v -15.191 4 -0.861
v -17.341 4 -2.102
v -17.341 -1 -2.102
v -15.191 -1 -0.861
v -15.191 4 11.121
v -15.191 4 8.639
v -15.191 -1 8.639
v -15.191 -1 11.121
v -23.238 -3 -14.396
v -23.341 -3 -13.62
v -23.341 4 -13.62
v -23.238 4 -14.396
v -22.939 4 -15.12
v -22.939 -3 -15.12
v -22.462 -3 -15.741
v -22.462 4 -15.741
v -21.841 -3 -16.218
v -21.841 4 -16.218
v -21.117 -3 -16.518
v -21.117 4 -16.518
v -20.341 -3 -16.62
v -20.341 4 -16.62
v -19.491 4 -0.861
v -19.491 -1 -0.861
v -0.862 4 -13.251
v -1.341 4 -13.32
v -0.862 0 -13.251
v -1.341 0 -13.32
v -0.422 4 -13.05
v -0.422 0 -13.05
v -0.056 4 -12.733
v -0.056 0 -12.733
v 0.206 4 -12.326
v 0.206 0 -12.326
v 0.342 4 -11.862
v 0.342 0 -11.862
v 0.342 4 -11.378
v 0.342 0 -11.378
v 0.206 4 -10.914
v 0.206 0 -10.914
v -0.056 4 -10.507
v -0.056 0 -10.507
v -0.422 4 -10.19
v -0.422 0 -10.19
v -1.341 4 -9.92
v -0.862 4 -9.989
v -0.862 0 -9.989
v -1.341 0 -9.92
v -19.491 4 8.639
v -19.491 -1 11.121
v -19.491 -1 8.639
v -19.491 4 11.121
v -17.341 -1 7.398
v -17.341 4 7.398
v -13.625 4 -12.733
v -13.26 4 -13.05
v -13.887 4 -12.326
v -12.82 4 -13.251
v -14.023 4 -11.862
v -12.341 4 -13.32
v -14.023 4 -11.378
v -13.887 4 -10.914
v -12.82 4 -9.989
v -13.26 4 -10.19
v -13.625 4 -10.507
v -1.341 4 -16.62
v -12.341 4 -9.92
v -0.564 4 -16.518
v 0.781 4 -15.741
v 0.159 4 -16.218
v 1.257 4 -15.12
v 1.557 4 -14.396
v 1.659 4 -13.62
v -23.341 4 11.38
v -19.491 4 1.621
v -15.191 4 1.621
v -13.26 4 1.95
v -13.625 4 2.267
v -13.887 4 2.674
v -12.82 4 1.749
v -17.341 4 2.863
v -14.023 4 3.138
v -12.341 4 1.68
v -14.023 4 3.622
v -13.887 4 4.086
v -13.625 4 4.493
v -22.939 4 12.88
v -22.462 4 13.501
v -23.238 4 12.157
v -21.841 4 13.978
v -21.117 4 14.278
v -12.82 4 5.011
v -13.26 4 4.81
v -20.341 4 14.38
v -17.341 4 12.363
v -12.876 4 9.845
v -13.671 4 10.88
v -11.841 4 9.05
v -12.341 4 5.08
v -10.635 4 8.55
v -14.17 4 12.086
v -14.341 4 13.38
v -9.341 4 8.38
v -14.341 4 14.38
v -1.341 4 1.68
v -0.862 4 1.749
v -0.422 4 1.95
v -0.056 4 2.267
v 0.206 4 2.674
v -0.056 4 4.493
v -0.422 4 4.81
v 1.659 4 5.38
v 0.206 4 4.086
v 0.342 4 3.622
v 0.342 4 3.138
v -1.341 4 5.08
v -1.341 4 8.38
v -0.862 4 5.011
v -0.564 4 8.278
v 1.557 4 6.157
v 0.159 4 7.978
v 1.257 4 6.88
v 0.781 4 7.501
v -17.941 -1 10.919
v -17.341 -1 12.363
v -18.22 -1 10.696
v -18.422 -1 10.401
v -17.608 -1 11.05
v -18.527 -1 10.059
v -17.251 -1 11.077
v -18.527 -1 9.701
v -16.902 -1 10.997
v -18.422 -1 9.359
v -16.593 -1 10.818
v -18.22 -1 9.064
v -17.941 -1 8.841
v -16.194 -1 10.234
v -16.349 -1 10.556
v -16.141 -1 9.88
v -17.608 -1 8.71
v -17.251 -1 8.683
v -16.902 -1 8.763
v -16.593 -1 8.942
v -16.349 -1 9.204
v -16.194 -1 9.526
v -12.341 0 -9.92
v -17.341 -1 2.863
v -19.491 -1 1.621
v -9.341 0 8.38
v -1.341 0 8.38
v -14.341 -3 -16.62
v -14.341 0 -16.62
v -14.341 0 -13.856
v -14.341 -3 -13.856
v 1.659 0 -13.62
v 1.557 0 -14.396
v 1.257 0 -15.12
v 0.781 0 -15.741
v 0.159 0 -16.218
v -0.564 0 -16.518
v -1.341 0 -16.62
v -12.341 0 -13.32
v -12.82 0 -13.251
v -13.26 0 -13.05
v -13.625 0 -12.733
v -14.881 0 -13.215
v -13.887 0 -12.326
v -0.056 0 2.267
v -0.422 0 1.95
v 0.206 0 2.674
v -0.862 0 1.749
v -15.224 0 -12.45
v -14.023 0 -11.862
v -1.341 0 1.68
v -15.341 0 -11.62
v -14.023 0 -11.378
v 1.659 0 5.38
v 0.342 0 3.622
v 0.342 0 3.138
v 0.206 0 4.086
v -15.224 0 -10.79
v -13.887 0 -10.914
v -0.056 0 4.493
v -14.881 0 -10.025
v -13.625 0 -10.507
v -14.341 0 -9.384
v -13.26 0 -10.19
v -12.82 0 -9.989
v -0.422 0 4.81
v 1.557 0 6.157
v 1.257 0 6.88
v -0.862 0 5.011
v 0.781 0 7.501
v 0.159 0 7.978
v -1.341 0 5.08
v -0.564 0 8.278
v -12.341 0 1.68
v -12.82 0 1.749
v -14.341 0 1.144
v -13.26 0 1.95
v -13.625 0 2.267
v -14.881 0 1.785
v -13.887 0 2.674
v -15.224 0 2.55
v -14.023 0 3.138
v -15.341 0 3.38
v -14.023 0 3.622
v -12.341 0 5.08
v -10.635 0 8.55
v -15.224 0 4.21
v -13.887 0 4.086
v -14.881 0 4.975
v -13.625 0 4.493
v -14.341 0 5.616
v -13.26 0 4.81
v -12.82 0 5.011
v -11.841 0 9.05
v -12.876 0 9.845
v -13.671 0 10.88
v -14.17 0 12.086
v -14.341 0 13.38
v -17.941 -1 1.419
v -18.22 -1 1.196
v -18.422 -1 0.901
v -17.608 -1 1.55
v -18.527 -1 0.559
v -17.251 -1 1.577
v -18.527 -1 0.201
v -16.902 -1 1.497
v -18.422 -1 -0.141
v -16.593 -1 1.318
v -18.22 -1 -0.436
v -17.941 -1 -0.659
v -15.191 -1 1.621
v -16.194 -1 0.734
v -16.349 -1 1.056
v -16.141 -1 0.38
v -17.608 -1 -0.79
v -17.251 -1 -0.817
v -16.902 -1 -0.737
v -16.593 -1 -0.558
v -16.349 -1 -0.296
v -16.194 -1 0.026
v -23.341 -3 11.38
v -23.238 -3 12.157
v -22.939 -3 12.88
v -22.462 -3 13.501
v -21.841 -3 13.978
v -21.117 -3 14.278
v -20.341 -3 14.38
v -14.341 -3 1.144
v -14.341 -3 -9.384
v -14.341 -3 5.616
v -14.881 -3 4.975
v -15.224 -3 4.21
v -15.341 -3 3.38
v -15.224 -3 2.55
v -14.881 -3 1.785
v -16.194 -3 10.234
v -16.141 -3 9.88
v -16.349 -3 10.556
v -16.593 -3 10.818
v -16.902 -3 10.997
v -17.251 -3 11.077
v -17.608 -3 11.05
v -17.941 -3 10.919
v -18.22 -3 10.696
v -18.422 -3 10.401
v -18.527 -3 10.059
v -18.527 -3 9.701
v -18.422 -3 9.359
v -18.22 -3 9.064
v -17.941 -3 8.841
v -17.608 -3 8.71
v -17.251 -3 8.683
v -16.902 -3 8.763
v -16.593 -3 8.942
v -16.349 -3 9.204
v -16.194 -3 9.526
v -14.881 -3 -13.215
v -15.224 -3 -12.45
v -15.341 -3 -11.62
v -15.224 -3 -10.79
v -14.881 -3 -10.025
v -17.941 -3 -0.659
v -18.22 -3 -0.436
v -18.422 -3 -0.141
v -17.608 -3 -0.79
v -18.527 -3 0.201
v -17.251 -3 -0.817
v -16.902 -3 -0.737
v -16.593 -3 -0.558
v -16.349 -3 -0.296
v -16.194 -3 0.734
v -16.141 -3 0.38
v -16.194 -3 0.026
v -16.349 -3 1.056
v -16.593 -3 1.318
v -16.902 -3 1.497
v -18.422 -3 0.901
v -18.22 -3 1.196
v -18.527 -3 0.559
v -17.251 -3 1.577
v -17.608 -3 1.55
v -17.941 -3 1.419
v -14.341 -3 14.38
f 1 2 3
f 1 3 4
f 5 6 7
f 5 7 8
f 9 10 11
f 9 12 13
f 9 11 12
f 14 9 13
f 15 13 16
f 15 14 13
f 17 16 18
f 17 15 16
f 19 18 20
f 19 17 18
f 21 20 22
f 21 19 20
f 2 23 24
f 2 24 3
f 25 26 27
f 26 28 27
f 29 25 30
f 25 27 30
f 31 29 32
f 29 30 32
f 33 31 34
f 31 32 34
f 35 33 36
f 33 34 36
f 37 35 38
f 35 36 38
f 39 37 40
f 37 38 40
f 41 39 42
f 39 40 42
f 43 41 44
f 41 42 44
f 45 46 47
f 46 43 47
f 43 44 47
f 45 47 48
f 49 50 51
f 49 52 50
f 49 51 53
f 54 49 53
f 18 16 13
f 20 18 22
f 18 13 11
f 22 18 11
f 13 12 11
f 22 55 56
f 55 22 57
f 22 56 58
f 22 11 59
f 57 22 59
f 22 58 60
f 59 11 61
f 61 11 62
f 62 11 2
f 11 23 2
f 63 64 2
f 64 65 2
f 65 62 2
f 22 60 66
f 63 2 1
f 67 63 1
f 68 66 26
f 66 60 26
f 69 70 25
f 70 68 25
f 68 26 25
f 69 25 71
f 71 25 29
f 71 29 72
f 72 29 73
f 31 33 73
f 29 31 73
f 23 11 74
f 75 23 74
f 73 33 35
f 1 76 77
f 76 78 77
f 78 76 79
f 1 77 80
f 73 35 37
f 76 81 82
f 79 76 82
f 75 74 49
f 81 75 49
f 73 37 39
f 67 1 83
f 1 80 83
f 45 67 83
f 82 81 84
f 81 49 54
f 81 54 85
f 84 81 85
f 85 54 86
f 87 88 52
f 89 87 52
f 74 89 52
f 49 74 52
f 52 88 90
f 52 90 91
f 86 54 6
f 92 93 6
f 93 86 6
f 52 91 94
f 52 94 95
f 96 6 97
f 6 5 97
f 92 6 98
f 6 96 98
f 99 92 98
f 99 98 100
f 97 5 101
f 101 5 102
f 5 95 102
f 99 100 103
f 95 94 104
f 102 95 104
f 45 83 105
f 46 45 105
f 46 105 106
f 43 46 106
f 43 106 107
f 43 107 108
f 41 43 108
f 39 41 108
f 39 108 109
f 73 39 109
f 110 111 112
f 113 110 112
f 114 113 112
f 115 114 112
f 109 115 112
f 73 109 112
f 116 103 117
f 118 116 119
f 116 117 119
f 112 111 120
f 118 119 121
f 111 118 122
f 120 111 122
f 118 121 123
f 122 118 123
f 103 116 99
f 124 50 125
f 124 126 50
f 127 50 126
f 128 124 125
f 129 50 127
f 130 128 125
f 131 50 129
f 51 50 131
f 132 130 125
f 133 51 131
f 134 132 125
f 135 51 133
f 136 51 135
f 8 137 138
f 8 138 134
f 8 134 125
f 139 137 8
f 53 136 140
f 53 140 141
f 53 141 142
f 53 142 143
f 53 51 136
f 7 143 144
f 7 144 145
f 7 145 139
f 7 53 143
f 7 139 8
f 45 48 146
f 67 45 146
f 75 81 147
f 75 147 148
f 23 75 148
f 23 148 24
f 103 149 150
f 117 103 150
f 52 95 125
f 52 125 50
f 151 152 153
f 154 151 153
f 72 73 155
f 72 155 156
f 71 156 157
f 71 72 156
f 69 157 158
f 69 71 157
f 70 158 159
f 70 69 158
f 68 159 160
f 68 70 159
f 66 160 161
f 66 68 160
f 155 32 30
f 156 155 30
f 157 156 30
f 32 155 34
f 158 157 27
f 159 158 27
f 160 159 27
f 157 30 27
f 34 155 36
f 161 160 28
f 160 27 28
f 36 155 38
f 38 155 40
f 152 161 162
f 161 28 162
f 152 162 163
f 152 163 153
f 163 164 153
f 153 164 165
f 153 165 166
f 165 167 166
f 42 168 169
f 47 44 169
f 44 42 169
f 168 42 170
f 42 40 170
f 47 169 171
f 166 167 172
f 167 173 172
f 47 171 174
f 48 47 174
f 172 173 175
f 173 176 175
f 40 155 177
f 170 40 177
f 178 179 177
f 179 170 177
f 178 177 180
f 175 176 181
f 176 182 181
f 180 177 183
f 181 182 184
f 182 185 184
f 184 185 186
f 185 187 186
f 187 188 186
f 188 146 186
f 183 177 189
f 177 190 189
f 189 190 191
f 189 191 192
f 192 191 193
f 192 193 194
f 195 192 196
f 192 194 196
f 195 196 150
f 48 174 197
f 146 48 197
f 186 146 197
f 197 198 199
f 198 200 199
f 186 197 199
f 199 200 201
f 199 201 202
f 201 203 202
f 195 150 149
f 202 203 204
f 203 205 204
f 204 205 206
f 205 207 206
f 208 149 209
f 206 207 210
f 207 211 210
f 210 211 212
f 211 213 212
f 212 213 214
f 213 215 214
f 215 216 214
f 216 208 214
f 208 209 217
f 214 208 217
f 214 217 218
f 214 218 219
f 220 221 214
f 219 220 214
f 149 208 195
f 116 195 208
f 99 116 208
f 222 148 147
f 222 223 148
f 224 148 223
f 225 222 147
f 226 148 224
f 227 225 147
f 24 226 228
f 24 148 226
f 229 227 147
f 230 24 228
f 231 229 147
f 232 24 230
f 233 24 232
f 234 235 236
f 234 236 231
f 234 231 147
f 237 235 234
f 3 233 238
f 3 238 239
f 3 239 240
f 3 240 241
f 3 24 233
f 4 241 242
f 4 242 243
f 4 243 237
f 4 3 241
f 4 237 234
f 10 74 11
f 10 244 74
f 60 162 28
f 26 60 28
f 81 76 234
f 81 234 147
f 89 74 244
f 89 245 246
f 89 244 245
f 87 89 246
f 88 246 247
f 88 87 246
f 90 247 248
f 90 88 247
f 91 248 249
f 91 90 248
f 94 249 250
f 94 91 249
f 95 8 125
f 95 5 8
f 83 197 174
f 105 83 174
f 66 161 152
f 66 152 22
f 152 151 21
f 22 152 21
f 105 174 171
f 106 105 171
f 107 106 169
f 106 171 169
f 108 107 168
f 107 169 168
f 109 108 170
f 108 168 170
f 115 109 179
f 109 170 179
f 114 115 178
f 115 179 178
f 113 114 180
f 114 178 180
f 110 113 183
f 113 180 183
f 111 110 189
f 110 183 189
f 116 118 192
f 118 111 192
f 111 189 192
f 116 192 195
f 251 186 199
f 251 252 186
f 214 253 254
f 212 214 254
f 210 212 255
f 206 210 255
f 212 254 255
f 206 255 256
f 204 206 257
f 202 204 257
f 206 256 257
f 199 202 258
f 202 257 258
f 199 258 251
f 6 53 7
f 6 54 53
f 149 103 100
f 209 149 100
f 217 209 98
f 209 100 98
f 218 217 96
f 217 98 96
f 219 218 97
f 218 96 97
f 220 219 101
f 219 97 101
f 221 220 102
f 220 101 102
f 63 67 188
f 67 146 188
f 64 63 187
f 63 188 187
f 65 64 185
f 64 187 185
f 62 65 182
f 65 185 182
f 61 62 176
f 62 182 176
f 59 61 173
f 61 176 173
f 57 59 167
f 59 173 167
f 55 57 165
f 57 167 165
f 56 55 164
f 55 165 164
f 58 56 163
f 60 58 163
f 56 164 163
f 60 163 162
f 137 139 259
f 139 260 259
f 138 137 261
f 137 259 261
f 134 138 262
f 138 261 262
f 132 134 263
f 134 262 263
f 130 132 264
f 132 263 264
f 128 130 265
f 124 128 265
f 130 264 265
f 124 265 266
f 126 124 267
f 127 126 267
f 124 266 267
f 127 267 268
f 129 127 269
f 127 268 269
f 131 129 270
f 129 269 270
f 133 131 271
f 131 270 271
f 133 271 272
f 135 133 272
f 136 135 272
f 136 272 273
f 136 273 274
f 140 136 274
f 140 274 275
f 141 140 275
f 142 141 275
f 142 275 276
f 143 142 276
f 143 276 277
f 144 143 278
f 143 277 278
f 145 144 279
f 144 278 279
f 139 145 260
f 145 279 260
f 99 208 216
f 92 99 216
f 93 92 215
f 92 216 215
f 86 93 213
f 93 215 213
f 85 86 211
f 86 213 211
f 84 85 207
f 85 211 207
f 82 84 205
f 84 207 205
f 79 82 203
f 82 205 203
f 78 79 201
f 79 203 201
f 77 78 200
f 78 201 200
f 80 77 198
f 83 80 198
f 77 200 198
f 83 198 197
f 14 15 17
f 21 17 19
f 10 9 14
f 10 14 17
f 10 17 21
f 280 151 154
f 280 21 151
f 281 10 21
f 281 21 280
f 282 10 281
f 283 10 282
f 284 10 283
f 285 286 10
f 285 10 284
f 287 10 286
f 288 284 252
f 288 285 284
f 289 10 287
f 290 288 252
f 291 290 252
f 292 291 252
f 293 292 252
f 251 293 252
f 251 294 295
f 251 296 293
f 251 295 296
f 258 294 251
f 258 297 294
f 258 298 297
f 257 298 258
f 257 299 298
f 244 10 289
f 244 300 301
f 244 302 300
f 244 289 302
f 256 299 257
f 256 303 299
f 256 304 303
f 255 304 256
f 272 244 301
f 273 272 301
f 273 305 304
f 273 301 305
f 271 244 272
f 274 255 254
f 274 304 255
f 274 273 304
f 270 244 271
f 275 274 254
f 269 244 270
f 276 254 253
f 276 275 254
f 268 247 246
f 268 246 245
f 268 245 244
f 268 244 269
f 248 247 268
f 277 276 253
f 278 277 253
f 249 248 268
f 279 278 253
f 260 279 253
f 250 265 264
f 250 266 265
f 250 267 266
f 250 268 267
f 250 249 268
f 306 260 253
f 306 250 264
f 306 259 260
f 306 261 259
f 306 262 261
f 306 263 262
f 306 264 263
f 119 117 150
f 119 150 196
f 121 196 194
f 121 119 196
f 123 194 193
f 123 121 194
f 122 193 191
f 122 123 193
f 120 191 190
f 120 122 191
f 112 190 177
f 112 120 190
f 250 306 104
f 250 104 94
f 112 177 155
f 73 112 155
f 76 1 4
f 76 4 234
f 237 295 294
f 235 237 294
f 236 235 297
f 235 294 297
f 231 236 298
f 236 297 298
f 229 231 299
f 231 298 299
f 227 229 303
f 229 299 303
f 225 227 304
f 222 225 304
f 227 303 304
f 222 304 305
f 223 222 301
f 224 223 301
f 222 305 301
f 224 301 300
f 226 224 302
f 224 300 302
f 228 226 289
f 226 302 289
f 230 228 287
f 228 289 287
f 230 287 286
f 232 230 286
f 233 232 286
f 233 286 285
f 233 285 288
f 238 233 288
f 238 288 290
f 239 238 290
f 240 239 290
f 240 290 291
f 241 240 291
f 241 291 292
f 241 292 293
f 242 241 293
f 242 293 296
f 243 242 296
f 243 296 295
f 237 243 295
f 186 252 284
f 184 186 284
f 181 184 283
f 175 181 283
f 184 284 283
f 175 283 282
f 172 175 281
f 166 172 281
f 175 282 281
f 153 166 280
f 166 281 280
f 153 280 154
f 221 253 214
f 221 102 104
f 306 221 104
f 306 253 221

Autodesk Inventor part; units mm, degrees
ref_plane "YZ Plane" through (0, 0, 0) normal (1, 0, 0) x (0, 1, 0)
ref_plane "XZ Plane" through (0, 0, 0) normal (0, 1, 0) x (-1, 0, 0)
ref_plane "XY Plane" through (0, 0, 0) normal (0, 0, 1) x (1, 0, 0)
sketch "Boceto1" plane through (0, 0, 0) normal (0, 1, 0) x (-1, 0, 0)
  line L0 (23.3407, 8.3801) -> (-1.6593, 8.3801)
  line L1 (-1.6593, 8.3801) -> (-1.6593, -16.6199)
  line L2 (-1.6593, -16.6199) -> (23.3407, -16.6199)
  line L3 (23.3407, -16.6199) -> (23.3407, 8.3801)
  circle A0 centre (1.3407, 3.3801) radius 1.7
  circle A1 centre (1.3407, -11.6199) radius 1.7
  circle A2 centre (12.3407, -11.6199) radius 1.7
  circle A3 centre (12.3407, 3.3801) radius 1.7
  line L4 (12.3407, -13.3199) -> (1.3407, -13.3199)
  line L5 (1.3407, -13.3199) -> (1.3407, -9.9199)
  line L6 (1.3407, -9.9199) -> (12.3407, -9.9199)
  line L7 (12.3407, -9.9199) -> (12.3407, -13.3199)
  line L8 (12.3407, 1.6801) -> (1.3407, 1.6801)
  line L9 (1.3407, 1.6801) -> (1.3407, 5.0801)
  line L10 (1.3407, 5.0801) -> (12.3407, 5.0801)
  line L11 (12.3407, 5.0801) -> (12.3407, 1.6801)
  point P0 (0, 0)
  point P1 (12.3407, 3.3801)
  point P2 (1.3407, -13.3199)
  point P3 (12.3407, 5.0801)
  point P4 (1.3407, 1.6801)
  dimension "d0" = 3.4
  dimension "d1" = 3
  dimension "d2" = 5
  dimension "d3" = 15
  dimension "d6" = 25
  dimension "d16" = 25
  dimension "d17" = 11
extrude "Extrusión1" add sketch "Boceto1" along normal blind 4
sketch "Boceto2" plane through (0, 4, 0) normal (0, 1, 0) x (1, 0, 0)
  line L0 (1.6593, 16.6199) -> (-23.3407, 16.6199) projected
  line L1 (-23.3407, -8.3801) -> (1.6593, -8.3801) projected
  line L2 (-23.3407, 16.6199) -> (-14.3407, 16.6199)
  line L3 (-14.3407, 16.6199) -> (-14.3407, -8.3801)
  line L4 (-14.3407, -8.3801) -> (-23.3407, -8.3801)
  line L5 (-23.3407, -8.3801) -> (-23.3407, 16.6199)
  point P0 (0, 0)
  point P1 (-14.3407, 16.6199)
  dimension "d7" = 9
extrude "Extrusión2" add sketch "Boceto2" against normal blind 7
sketch "Boceto5" plane through (0, -3, 0) normal (0, -1, 0) x (1, 0, 0)
  line L0 (-14.3407, 8.3801) -> (-23.3407, 8.3801) projected
  line L1 (-23.3407, 8.3801) -> (-14.3407, 8.3801)
  line L2 (-14.3407, 8.3801) -> (-14.3407, 14.3801)
  line L3 (-14.3407, 14.3801) -> (-23.3407, 14.3801)
  line L4 (-23.3407, 14.3801) -> (-23.3407, 8.3801)
  line L5 (-14.3407, -16.6199) -> (-14.3407, 8.3801) projected
  point P0 (0, 0)
  dimension "d24" = 6
extrude "Extrusión5" add sketch "Boceto5" against normal up to surface (7 mm away)
fillet "Empalme2" radius 5 1 edges at (-14.3407, 2, 8.3801)
sketch "Boceto3" plane through (0, -3, 0) normal (0, -1, 0) x (1, 0, 0)
  circle A0 centre (-17.3407, 9.8801) radius 1.2
  circle A1 centre (-17.3407, 0.3801) radius 1.2
  line L0 (-14.3407, -16.6199) -> (-14.3407, 8.3801) projected
  line L1 (-23.3407, -16.6199) -> (-14.3407, -16.6199) projected
  line L2 (-23.3407, 14.3801) -> (-23.3407, -16.6199) projected
  point P0 (0, 0)
  dimension "d10" = 2.4
  dimension "d11" = 9.5
  dimension "d19" = 17
  dimension "d30" = 6
extrude "Extrusión3" cut sketch "Boceto3" against normal through all
sketch "Boceto4" plane through (0, 4, 0) normal (0, 1, 0) x (1, 0, 0)
  circle A0 centre (-17.3407, -9.8801) radius 1.2 projected
  circle A1 centre (-17.3407, -9.8801) radius 2.15
  line L0 (-17.3407, -12.3627) -> (-19.4907, -11.1214)
  line L1 (-19.4907, -11.1214) -> (-19.4907, -8.6388)
  line L2 (-19.4907, -8.6388) -> (-17.3407, -7.3975)
  line L3 (-17.3407, -7.3975) -> (-15.1907, -8.6388)
  line L4 (-15.1907, -8.6388) -> (-15.1907, -11.1214)
  line L5 (-15.1907, -11.1214) -> (-17.3407, -12.3627)
  circle A2 centre (-17.3407, -0.3801) radius 1.2 projected
  circle A3 centre (-17.3407, -0.3801) radius 2.15
  line L6 (-17.3407, 2.1025) -> (-15.1907, 0.8612)
  line L7 (-15.1907, 0.8612) -> (-15.1907, -1.6214)
  line L8 (-15.1907, -1.6214) -> (-17.3407, -2.8627)
  line L9 (-17.3407, -2.8627) -> (-19.4907, -1.6214)
  line L10 (-19.4907, -1.6214) -> (-19.4907, 0.8612)
  line L11 (-19.4907, 0.8612) -> (-17.3407, 2.1025)
  point P0 (0, 0)
  dimension "d29" = 4.3
extrude "Extrusión4" cut sketch "Boceto4" against normal blind 5 contours A0 | A1 | L4 L5 A1 | A1 L3 L4 | A1 L2 L3 | L5 L0 A1 | A1 L1 L2 | L0 L1 A1 | A2 | A3 | L7 L8 A3 | A3 L6 L7 | A3 L11 L6 | L8 L9 A3 | A3 L10 L11 | L9 L10 A3
fillet "Empalme3" radius 3 4 edges at (-23.3407, 0.5, 14.3801) (-23.3407, 0.5, -16.6199) (1.6593, 2, 8.3801) (1.6593, 2, -16.6199)
sketch "Boceto6" plane through (0, 0, 0) normal (0, -1, 0) x (1, 0, 0)
  point P0 (0, 0)
sketch "Boceto7" plane through (0, -3, 0) normal (0, -1, 0) x (1, 0, 0)
  arc A0 (-12.3407, 5.0801) -> (-12.3407, 1.6801) centre (-12.3407, 3.3801) ccw projected
  circle A1 centre (-12.3407, 3.3801) radius 3
  arc A2 (-12.3407, -9.9199) -> (-12.3407, -13.3199) centre (-12.3407, -11.6199) ccw projected
  circle A3 centre (-12.3407, -11.6199) radius 3
  point P0 (0, 0)
  dimension "d31" = 6
  dimension "d32" = 6
extrude "Extrusión6" cut sketch "Boceto7" against normal up to surface (3 mm away)
properties part number "shoulder endstop support"
